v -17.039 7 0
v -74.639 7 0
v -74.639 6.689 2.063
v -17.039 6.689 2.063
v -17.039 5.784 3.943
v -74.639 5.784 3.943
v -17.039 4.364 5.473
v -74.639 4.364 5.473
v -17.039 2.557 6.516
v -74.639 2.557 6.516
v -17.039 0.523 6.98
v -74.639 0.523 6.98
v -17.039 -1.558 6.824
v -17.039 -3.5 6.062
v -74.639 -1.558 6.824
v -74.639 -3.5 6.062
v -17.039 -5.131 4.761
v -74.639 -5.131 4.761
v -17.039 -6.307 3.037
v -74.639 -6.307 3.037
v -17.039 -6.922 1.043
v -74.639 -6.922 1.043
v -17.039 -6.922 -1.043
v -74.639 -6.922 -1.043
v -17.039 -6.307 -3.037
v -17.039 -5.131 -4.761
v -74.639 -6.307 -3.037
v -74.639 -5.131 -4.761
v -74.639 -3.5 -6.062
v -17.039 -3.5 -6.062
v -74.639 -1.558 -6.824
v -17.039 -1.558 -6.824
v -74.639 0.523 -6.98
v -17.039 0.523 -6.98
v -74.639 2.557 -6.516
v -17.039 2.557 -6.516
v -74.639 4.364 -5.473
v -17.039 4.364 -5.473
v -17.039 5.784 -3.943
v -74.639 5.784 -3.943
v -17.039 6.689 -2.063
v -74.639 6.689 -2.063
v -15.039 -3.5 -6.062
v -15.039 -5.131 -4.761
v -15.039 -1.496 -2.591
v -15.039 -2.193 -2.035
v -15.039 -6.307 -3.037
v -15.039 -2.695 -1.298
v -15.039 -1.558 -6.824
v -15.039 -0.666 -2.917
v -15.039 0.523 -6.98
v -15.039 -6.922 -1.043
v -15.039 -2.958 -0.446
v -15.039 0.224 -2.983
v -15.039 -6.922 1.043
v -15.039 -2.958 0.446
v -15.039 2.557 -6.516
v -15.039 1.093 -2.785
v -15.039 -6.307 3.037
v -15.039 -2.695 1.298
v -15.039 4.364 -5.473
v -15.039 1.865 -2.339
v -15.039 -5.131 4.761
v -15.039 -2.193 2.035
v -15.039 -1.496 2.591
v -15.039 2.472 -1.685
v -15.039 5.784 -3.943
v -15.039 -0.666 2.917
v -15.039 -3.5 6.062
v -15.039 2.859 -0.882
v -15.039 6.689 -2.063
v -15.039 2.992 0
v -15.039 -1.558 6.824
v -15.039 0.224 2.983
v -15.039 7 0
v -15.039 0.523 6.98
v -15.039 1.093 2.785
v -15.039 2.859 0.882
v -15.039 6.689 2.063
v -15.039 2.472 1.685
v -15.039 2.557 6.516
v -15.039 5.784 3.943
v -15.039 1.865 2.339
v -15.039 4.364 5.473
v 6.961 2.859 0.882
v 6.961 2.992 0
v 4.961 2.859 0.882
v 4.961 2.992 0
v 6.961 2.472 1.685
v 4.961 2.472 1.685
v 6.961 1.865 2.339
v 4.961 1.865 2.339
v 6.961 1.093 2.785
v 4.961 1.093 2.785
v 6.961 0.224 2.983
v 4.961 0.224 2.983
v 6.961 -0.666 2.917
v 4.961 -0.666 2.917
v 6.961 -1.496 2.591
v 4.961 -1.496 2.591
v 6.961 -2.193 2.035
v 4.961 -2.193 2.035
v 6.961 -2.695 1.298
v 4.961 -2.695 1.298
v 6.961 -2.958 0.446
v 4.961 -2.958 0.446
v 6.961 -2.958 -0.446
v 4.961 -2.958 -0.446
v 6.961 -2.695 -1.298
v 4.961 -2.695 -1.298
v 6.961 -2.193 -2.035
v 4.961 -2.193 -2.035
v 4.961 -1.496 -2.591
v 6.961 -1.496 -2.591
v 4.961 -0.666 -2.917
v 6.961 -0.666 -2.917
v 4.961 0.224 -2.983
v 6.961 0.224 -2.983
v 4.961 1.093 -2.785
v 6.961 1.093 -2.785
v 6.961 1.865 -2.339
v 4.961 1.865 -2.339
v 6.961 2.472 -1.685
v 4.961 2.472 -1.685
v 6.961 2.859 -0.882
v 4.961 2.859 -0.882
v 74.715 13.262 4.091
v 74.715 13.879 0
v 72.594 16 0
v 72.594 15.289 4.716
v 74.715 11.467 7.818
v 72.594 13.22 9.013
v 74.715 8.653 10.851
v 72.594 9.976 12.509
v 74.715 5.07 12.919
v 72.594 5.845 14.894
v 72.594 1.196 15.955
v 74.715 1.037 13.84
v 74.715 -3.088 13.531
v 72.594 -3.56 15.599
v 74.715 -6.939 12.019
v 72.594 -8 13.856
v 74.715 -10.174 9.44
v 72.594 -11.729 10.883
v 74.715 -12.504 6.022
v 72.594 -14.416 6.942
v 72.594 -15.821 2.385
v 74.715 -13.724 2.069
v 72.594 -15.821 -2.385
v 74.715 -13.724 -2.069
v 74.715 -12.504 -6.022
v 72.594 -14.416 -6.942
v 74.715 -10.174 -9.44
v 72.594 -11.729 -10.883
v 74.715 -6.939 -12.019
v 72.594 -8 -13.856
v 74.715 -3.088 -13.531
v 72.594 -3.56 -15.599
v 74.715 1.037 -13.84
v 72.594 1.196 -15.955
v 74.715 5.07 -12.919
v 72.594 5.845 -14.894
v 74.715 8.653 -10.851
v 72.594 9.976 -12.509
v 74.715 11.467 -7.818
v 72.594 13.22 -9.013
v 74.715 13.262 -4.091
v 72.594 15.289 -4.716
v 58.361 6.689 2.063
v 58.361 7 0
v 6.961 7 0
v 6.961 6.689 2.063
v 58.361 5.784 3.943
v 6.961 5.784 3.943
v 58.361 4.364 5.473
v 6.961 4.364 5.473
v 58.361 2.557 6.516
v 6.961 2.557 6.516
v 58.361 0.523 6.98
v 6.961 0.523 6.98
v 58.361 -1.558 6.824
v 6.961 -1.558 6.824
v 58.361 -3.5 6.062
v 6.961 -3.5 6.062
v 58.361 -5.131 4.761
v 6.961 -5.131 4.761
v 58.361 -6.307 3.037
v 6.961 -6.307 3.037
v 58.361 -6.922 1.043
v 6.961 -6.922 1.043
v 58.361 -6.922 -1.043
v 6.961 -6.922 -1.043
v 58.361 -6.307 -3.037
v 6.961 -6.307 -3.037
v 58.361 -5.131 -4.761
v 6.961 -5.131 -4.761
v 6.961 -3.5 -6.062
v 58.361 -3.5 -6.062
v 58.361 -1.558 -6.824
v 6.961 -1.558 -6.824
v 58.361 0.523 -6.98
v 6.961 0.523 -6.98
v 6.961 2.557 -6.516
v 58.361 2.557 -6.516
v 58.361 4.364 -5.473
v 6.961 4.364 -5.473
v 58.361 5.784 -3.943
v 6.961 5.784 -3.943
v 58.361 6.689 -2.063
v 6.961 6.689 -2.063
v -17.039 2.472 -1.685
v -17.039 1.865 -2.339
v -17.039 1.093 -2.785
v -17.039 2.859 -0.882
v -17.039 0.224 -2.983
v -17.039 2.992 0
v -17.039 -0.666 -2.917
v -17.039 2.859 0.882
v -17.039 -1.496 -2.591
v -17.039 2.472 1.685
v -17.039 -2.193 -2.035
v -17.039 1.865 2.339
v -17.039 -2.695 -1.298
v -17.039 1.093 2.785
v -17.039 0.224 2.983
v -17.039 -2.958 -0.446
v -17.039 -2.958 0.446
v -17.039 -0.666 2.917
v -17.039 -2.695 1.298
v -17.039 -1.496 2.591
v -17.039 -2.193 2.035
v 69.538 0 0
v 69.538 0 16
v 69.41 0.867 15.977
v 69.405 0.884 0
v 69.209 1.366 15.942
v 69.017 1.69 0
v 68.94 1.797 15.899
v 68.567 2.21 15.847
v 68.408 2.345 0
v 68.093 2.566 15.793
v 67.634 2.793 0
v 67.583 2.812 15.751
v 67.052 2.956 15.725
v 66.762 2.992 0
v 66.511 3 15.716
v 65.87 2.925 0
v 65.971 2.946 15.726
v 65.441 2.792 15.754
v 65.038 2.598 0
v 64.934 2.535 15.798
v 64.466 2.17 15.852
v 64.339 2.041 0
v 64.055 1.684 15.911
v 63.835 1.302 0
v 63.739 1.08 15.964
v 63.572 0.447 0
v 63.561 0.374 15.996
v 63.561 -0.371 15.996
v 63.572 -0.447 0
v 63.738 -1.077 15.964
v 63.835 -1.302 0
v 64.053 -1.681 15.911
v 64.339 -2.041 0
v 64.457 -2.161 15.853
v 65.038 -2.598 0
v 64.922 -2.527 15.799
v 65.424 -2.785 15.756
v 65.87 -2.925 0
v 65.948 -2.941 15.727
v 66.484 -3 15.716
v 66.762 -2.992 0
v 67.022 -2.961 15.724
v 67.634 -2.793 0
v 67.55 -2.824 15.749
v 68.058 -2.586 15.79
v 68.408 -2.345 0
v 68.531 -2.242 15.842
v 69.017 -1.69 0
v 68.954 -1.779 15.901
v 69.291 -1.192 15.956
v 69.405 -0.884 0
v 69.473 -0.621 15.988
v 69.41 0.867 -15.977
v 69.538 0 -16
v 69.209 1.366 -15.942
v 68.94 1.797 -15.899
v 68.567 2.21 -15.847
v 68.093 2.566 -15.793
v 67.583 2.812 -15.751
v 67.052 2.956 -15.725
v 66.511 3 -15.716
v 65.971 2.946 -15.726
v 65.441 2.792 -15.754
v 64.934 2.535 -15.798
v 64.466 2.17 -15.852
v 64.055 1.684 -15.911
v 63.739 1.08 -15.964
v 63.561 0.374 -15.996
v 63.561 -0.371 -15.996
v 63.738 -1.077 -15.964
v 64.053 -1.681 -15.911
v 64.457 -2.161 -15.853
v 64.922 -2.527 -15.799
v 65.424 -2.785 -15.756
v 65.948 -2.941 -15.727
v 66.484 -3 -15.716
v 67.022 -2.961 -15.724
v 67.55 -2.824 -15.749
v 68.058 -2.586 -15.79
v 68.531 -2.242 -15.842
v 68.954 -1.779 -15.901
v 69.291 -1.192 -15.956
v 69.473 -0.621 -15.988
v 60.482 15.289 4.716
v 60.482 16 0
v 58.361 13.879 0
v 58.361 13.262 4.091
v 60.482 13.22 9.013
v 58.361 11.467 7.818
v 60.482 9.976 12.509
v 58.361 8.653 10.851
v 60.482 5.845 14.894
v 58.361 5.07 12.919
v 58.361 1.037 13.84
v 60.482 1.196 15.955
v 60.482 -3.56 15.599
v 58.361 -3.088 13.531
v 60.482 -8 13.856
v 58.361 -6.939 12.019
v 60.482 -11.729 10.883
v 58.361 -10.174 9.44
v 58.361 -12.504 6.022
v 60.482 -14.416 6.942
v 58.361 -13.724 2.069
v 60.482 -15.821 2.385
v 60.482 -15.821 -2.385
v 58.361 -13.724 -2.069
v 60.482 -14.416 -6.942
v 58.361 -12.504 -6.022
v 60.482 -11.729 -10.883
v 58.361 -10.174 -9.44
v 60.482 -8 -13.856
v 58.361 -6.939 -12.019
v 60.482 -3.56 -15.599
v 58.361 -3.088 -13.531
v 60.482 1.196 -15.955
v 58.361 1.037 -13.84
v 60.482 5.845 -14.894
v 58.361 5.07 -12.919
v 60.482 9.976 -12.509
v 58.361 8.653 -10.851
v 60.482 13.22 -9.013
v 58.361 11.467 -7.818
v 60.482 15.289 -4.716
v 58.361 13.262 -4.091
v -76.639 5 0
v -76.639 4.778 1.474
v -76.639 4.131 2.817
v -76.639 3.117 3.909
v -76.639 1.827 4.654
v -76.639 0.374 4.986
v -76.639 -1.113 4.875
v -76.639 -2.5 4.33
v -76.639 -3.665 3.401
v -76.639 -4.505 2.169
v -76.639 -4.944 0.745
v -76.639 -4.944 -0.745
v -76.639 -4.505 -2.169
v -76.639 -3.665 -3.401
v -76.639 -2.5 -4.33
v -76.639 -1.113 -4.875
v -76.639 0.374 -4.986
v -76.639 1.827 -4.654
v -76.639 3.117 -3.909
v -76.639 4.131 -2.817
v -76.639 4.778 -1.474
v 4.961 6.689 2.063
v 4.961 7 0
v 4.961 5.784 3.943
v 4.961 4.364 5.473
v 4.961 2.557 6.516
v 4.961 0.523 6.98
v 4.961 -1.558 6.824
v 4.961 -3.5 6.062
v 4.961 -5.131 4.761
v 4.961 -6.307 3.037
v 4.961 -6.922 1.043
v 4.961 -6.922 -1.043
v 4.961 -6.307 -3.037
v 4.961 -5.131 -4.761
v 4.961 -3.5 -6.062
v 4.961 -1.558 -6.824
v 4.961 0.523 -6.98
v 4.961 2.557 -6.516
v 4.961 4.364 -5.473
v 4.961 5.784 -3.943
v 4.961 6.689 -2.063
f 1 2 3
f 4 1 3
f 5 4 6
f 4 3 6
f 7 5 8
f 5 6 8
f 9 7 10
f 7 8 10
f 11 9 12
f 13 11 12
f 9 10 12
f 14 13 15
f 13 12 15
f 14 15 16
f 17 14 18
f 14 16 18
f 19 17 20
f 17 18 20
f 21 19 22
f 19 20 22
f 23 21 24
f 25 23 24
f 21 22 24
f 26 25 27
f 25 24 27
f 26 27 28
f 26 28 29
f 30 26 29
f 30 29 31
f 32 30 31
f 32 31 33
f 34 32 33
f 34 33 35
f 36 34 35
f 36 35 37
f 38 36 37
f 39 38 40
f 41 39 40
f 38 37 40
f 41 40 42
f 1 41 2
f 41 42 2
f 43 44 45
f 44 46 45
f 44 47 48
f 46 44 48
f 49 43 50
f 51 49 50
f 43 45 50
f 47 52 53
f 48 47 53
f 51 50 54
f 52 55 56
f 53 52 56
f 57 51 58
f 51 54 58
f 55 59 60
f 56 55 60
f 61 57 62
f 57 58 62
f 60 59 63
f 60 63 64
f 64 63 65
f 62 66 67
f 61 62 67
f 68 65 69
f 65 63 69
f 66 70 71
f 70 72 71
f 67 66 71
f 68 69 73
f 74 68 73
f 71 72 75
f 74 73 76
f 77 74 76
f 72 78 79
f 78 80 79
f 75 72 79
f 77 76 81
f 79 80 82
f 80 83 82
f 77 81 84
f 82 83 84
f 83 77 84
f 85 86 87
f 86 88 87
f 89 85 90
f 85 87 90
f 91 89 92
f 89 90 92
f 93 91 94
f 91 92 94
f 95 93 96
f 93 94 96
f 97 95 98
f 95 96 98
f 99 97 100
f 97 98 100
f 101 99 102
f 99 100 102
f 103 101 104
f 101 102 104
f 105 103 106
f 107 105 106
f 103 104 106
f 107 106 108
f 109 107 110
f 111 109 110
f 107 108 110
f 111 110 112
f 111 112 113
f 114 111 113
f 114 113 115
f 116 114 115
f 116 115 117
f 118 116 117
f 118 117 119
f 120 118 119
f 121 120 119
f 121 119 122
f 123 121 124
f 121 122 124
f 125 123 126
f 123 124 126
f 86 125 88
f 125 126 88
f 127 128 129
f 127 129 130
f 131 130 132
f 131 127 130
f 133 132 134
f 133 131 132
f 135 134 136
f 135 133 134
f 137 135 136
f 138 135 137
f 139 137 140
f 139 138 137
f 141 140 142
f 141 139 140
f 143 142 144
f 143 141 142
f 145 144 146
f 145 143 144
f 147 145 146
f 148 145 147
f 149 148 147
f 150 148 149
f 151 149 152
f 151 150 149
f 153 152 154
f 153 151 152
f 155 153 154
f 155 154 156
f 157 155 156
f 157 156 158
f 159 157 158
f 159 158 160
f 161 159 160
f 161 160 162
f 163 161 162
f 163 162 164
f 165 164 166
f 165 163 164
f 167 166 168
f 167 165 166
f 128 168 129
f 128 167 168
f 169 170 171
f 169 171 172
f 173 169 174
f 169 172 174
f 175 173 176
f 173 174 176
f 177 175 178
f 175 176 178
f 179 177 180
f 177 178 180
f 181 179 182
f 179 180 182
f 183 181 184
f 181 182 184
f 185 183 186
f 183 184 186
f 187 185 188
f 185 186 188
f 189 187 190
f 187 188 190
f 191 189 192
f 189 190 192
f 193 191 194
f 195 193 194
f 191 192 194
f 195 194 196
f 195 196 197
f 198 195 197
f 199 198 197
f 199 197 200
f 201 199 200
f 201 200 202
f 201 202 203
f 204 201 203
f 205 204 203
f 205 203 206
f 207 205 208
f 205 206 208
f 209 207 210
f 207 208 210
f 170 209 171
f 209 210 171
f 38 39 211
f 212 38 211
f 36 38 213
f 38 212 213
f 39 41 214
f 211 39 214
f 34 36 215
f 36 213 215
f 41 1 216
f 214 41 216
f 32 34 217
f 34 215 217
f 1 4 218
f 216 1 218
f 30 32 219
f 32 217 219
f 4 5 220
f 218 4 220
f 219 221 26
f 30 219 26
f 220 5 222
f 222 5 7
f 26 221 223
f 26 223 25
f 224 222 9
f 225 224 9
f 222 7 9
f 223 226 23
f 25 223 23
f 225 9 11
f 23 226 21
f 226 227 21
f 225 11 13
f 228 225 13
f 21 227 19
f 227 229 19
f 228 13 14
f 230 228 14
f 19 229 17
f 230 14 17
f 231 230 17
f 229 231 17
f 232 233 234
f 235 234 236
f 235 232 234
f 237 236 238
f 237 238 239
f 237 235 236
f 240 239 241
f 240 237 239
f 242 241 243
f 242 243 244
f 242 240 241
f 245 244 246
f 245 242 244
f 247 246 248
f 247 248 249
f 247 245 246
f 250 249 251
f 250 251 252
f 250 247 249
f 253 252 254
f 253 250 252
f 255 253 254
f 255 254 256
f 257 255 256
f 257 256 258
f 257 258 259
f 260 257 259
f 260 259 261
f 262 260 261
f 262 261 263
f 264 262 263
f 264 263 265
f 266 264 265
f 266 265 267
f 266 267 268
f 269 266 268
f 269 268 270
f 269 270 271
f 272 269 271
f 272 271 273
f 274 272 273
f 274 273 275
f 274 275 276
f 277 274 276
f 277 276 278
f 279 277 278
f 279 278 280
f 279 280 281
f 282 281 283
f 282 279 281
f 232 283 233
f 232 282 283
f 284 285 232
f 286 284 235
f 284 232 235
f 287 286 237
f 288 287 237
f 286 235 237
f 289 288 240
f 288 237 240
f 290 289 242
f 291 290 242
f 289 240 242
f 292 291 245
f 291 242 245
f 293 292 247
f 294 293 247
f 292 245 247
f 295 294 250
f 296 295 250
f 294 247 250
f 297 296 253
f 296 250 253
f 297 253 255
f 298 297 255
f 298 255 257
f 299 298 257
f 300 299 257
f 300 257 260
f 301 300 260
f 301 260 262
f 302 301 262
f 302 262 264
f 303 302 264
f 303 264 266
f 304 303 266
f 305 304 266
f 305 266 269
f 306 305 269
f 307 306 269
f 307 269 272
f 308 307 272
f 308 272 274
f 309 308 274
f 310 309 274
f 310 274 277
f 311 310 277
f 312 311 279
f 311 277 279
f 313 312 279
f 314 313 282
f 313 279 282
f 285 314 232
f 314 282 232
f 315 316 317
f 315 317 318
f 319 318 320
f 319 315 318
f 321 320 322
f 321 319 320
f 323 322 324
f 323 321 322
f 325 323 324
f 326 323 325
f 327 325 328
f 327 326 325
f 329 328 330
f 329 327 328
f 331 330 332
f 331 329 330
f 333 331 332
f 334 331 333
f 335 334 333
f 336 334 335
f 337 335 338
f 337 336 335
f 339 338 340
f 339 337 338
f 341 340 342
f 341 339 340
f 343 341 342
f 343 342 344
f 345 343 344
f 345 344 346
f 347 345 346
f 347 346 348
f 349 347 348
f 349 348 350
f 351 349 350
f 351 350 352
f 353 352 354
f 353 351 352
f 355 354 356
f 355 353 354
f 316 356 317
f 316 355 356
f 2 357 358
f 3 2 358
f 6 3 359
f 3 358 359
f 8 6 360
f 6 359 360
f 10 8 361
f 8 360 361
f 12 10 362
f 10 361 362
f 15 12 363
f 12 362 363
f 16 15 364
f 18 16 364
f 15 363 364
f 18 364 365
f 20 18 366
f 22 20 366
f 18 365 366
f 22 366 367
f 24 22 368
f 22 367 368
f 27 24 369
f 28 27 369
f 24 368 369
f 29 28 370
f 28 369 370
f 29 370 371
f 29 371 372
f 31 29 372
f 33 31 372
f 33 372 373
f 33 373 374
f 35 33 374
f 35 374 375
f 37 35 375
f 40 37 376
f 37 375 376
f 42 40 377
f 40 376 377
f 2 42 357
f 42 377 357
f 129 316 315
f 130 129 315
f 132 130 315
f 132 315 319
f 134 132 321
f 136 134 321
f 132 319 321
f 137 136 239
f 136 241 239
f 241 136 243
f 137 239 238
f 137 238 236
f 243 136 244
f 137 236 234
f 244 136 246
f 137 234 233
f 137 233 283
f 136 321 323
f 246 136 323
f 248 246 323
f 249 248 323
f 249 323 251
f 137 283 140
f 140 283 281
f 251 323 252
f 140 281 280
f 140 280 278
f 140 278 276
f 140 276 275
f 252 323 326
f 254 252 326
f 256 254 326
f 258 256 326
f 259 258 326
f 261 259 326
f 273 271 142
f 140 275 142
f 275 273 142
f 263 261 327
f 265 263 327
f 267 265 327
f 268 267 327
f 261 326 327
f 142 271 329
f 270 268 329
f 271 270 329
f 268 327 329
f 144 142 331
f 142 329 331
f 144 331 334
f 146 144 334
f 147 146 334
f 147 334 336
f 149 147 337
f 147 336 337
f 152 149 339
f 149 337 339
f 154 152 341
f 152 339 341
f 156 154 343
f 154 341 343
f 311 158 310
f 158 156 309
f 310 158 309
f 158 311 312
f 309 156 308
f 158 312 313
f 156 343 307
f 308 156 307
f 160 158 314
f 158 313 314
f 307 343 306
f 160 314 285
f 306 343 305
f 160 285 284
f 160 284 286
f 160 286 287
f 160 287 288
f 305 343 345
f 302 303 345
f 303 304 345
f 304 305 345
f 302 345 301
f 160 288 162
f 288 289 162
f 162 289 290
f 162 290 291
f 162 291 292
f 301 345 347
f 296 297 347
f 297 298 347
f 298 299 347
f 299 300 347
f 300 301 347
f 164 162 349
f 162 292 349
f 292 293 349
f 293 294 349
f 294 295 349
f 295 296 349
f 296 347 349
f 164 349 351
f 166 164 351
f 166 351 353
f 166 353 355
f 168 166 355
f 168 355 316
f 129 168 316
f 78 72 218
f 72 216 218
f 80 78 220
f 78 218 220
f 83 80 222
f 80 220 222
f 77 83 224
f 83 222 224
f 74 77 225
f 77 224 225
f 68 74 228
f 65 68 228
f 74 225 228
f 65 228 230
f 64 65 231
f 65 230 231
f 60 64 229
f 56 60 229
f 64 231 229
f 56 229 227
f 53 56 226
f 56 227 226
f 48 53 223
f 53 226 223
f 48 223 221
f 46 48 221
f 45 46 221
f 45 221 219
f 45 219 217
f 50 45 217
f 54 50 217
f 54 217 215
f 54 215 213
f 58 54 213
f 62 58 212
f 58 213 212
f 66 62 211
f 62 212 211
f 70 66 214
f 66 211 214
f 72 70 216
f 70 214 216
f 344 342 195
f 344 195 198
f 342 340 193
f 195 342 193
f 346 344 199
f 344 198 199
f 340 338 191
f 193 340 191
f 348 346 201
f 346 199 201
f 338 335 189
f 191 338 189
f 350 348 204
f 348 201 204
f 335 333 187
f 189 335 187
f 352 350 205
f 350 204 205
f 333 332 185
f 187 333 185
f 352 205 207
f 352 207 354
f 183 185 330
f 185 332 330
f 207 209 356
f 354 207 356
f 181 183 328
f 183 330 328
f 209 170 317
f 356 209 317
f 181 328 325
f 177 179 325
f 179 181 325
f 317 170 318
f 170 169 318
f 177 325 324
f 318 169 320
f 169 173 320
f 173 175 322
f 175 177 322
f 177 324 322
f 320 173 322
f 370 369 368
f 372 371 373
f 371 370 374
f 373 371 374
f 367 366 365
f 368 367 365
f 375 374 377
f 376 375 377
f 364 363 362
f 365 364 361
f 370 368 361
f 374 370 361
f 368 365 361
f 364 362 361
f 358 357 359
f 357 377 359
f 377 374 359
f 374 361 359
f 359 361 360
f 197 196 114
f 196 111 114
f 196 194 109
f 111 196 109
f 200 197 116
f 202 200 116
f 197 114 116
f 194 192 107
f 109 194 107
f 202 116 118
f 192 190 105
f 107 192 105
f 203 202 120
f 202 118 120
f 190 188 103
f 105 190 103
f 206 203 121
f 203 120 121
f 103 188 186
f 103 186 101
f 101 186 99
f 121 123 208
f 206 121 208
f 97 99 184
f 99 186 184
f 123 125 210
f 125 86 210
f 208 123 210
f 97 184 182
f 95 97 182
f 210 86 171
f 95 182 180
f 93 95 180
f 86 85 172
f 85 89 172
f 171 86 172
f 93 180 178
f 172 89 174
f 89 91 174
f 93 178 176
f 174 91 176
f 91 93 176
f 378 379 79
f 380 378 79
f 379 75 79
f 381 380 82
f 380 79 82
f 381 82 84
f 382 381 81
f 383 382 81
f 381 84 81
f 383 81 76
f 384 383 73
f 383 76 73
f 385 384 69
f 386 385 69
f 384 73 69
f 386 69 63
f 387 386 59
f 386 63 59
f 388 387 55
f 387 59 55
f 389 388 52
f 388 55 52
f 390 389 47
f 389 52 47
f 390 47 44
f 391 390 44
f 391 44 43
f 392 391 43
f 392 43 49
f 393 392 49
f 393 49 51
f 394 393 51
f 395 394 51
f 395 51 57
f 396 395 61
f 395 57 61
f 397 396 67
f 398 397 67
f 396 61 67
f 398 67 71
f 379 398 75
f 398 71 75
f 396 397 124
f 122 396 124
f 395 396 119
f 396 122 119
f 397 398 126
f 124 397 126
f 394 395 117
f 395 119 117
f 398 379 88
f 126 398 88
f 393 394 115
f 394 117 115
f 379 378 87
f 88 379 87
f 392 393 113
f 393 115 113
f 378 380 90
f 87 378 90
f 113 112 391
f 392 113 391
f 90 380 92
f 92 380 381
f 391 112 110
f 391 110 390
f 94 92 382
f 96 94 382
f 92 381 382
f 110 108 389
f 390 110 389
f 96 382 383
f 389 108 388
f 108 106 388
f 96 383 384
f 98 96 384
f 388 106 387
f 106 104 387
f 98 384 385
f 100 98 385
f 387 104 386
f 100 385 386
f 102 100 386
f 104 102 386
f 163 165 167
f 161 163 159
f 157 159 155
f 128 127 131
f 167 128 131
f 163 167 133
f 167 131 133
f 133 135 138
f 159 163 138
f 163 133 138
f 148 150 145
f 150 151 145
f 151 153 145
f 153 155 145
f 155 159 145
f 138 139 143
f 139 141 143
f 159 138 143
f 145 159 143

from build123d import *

# Parameters (mm, degrees)
CHAMFER1_SIZE           = 2
CHAMFER2_SIZE           = 2.1213
CUT_EXTRUDE1_DEPTH      = 135
CUT_EXTRUDE1_DEPTH_BACK = 135
SKETCH3_R               = 3


with BuildPart() as part:
    # Sketch2 → Revolve1 (revolve)
    with BuildSketch(Plane.XY):
        Polygon((-76.638954869, 0), (74.714964371, 0), (74.714964371, 16), (58.361045131, 16), (58.361045131, 7), (6.961045131, 7), (6.961045131, 2.991686461), (4.961045131, 2.991686461), (4.961045131, 7), (-15.038954869, 7), (-15.038954869, 2.991686461), (-17.038954869, 2.991686461), (-17.038954869, 7), (-76.638954869, 7), align=None)
    revolve(axis=Axis((-76.638954869, 0, 0), (1, 0, 0)))

    # Chamfer1
    chamfer1_edges = [part.edges().sort_by_distance(p)[0] for p in [
        (-76.638954869, -7, 0),
    ]]
    chamfer(chamfer1_edges, length=CHAMFER1_SIZE)

    # Chamfer2
    chamfer2_edges = [part.edges().sort_by_distance(p)[0] for p in [
        (58.361045131, -16, 0),
        (74.714964371, -16, 0),
    ]]
    chamfer(chamfer2_edges, length=CHAMFER2_SIZE)

    # Sketch3 → Cut-Extrude1 (cut, two sides: drawn at the far end of the back side and taken through both)
    with BuildSketch(Plane.XY.offset(-CUT_EXTRUDE1_DEPTH_BACK)):
        with Locations((66.538004751, 0)):
            Circle(SKETCH3_R)
    extrude(amount=CUT_EXTRUDE1_DEPTH + CUT_EXTRUDE1_DEPTH_BACK, mode=Mode.SUBTRACT)


solid = part.part
